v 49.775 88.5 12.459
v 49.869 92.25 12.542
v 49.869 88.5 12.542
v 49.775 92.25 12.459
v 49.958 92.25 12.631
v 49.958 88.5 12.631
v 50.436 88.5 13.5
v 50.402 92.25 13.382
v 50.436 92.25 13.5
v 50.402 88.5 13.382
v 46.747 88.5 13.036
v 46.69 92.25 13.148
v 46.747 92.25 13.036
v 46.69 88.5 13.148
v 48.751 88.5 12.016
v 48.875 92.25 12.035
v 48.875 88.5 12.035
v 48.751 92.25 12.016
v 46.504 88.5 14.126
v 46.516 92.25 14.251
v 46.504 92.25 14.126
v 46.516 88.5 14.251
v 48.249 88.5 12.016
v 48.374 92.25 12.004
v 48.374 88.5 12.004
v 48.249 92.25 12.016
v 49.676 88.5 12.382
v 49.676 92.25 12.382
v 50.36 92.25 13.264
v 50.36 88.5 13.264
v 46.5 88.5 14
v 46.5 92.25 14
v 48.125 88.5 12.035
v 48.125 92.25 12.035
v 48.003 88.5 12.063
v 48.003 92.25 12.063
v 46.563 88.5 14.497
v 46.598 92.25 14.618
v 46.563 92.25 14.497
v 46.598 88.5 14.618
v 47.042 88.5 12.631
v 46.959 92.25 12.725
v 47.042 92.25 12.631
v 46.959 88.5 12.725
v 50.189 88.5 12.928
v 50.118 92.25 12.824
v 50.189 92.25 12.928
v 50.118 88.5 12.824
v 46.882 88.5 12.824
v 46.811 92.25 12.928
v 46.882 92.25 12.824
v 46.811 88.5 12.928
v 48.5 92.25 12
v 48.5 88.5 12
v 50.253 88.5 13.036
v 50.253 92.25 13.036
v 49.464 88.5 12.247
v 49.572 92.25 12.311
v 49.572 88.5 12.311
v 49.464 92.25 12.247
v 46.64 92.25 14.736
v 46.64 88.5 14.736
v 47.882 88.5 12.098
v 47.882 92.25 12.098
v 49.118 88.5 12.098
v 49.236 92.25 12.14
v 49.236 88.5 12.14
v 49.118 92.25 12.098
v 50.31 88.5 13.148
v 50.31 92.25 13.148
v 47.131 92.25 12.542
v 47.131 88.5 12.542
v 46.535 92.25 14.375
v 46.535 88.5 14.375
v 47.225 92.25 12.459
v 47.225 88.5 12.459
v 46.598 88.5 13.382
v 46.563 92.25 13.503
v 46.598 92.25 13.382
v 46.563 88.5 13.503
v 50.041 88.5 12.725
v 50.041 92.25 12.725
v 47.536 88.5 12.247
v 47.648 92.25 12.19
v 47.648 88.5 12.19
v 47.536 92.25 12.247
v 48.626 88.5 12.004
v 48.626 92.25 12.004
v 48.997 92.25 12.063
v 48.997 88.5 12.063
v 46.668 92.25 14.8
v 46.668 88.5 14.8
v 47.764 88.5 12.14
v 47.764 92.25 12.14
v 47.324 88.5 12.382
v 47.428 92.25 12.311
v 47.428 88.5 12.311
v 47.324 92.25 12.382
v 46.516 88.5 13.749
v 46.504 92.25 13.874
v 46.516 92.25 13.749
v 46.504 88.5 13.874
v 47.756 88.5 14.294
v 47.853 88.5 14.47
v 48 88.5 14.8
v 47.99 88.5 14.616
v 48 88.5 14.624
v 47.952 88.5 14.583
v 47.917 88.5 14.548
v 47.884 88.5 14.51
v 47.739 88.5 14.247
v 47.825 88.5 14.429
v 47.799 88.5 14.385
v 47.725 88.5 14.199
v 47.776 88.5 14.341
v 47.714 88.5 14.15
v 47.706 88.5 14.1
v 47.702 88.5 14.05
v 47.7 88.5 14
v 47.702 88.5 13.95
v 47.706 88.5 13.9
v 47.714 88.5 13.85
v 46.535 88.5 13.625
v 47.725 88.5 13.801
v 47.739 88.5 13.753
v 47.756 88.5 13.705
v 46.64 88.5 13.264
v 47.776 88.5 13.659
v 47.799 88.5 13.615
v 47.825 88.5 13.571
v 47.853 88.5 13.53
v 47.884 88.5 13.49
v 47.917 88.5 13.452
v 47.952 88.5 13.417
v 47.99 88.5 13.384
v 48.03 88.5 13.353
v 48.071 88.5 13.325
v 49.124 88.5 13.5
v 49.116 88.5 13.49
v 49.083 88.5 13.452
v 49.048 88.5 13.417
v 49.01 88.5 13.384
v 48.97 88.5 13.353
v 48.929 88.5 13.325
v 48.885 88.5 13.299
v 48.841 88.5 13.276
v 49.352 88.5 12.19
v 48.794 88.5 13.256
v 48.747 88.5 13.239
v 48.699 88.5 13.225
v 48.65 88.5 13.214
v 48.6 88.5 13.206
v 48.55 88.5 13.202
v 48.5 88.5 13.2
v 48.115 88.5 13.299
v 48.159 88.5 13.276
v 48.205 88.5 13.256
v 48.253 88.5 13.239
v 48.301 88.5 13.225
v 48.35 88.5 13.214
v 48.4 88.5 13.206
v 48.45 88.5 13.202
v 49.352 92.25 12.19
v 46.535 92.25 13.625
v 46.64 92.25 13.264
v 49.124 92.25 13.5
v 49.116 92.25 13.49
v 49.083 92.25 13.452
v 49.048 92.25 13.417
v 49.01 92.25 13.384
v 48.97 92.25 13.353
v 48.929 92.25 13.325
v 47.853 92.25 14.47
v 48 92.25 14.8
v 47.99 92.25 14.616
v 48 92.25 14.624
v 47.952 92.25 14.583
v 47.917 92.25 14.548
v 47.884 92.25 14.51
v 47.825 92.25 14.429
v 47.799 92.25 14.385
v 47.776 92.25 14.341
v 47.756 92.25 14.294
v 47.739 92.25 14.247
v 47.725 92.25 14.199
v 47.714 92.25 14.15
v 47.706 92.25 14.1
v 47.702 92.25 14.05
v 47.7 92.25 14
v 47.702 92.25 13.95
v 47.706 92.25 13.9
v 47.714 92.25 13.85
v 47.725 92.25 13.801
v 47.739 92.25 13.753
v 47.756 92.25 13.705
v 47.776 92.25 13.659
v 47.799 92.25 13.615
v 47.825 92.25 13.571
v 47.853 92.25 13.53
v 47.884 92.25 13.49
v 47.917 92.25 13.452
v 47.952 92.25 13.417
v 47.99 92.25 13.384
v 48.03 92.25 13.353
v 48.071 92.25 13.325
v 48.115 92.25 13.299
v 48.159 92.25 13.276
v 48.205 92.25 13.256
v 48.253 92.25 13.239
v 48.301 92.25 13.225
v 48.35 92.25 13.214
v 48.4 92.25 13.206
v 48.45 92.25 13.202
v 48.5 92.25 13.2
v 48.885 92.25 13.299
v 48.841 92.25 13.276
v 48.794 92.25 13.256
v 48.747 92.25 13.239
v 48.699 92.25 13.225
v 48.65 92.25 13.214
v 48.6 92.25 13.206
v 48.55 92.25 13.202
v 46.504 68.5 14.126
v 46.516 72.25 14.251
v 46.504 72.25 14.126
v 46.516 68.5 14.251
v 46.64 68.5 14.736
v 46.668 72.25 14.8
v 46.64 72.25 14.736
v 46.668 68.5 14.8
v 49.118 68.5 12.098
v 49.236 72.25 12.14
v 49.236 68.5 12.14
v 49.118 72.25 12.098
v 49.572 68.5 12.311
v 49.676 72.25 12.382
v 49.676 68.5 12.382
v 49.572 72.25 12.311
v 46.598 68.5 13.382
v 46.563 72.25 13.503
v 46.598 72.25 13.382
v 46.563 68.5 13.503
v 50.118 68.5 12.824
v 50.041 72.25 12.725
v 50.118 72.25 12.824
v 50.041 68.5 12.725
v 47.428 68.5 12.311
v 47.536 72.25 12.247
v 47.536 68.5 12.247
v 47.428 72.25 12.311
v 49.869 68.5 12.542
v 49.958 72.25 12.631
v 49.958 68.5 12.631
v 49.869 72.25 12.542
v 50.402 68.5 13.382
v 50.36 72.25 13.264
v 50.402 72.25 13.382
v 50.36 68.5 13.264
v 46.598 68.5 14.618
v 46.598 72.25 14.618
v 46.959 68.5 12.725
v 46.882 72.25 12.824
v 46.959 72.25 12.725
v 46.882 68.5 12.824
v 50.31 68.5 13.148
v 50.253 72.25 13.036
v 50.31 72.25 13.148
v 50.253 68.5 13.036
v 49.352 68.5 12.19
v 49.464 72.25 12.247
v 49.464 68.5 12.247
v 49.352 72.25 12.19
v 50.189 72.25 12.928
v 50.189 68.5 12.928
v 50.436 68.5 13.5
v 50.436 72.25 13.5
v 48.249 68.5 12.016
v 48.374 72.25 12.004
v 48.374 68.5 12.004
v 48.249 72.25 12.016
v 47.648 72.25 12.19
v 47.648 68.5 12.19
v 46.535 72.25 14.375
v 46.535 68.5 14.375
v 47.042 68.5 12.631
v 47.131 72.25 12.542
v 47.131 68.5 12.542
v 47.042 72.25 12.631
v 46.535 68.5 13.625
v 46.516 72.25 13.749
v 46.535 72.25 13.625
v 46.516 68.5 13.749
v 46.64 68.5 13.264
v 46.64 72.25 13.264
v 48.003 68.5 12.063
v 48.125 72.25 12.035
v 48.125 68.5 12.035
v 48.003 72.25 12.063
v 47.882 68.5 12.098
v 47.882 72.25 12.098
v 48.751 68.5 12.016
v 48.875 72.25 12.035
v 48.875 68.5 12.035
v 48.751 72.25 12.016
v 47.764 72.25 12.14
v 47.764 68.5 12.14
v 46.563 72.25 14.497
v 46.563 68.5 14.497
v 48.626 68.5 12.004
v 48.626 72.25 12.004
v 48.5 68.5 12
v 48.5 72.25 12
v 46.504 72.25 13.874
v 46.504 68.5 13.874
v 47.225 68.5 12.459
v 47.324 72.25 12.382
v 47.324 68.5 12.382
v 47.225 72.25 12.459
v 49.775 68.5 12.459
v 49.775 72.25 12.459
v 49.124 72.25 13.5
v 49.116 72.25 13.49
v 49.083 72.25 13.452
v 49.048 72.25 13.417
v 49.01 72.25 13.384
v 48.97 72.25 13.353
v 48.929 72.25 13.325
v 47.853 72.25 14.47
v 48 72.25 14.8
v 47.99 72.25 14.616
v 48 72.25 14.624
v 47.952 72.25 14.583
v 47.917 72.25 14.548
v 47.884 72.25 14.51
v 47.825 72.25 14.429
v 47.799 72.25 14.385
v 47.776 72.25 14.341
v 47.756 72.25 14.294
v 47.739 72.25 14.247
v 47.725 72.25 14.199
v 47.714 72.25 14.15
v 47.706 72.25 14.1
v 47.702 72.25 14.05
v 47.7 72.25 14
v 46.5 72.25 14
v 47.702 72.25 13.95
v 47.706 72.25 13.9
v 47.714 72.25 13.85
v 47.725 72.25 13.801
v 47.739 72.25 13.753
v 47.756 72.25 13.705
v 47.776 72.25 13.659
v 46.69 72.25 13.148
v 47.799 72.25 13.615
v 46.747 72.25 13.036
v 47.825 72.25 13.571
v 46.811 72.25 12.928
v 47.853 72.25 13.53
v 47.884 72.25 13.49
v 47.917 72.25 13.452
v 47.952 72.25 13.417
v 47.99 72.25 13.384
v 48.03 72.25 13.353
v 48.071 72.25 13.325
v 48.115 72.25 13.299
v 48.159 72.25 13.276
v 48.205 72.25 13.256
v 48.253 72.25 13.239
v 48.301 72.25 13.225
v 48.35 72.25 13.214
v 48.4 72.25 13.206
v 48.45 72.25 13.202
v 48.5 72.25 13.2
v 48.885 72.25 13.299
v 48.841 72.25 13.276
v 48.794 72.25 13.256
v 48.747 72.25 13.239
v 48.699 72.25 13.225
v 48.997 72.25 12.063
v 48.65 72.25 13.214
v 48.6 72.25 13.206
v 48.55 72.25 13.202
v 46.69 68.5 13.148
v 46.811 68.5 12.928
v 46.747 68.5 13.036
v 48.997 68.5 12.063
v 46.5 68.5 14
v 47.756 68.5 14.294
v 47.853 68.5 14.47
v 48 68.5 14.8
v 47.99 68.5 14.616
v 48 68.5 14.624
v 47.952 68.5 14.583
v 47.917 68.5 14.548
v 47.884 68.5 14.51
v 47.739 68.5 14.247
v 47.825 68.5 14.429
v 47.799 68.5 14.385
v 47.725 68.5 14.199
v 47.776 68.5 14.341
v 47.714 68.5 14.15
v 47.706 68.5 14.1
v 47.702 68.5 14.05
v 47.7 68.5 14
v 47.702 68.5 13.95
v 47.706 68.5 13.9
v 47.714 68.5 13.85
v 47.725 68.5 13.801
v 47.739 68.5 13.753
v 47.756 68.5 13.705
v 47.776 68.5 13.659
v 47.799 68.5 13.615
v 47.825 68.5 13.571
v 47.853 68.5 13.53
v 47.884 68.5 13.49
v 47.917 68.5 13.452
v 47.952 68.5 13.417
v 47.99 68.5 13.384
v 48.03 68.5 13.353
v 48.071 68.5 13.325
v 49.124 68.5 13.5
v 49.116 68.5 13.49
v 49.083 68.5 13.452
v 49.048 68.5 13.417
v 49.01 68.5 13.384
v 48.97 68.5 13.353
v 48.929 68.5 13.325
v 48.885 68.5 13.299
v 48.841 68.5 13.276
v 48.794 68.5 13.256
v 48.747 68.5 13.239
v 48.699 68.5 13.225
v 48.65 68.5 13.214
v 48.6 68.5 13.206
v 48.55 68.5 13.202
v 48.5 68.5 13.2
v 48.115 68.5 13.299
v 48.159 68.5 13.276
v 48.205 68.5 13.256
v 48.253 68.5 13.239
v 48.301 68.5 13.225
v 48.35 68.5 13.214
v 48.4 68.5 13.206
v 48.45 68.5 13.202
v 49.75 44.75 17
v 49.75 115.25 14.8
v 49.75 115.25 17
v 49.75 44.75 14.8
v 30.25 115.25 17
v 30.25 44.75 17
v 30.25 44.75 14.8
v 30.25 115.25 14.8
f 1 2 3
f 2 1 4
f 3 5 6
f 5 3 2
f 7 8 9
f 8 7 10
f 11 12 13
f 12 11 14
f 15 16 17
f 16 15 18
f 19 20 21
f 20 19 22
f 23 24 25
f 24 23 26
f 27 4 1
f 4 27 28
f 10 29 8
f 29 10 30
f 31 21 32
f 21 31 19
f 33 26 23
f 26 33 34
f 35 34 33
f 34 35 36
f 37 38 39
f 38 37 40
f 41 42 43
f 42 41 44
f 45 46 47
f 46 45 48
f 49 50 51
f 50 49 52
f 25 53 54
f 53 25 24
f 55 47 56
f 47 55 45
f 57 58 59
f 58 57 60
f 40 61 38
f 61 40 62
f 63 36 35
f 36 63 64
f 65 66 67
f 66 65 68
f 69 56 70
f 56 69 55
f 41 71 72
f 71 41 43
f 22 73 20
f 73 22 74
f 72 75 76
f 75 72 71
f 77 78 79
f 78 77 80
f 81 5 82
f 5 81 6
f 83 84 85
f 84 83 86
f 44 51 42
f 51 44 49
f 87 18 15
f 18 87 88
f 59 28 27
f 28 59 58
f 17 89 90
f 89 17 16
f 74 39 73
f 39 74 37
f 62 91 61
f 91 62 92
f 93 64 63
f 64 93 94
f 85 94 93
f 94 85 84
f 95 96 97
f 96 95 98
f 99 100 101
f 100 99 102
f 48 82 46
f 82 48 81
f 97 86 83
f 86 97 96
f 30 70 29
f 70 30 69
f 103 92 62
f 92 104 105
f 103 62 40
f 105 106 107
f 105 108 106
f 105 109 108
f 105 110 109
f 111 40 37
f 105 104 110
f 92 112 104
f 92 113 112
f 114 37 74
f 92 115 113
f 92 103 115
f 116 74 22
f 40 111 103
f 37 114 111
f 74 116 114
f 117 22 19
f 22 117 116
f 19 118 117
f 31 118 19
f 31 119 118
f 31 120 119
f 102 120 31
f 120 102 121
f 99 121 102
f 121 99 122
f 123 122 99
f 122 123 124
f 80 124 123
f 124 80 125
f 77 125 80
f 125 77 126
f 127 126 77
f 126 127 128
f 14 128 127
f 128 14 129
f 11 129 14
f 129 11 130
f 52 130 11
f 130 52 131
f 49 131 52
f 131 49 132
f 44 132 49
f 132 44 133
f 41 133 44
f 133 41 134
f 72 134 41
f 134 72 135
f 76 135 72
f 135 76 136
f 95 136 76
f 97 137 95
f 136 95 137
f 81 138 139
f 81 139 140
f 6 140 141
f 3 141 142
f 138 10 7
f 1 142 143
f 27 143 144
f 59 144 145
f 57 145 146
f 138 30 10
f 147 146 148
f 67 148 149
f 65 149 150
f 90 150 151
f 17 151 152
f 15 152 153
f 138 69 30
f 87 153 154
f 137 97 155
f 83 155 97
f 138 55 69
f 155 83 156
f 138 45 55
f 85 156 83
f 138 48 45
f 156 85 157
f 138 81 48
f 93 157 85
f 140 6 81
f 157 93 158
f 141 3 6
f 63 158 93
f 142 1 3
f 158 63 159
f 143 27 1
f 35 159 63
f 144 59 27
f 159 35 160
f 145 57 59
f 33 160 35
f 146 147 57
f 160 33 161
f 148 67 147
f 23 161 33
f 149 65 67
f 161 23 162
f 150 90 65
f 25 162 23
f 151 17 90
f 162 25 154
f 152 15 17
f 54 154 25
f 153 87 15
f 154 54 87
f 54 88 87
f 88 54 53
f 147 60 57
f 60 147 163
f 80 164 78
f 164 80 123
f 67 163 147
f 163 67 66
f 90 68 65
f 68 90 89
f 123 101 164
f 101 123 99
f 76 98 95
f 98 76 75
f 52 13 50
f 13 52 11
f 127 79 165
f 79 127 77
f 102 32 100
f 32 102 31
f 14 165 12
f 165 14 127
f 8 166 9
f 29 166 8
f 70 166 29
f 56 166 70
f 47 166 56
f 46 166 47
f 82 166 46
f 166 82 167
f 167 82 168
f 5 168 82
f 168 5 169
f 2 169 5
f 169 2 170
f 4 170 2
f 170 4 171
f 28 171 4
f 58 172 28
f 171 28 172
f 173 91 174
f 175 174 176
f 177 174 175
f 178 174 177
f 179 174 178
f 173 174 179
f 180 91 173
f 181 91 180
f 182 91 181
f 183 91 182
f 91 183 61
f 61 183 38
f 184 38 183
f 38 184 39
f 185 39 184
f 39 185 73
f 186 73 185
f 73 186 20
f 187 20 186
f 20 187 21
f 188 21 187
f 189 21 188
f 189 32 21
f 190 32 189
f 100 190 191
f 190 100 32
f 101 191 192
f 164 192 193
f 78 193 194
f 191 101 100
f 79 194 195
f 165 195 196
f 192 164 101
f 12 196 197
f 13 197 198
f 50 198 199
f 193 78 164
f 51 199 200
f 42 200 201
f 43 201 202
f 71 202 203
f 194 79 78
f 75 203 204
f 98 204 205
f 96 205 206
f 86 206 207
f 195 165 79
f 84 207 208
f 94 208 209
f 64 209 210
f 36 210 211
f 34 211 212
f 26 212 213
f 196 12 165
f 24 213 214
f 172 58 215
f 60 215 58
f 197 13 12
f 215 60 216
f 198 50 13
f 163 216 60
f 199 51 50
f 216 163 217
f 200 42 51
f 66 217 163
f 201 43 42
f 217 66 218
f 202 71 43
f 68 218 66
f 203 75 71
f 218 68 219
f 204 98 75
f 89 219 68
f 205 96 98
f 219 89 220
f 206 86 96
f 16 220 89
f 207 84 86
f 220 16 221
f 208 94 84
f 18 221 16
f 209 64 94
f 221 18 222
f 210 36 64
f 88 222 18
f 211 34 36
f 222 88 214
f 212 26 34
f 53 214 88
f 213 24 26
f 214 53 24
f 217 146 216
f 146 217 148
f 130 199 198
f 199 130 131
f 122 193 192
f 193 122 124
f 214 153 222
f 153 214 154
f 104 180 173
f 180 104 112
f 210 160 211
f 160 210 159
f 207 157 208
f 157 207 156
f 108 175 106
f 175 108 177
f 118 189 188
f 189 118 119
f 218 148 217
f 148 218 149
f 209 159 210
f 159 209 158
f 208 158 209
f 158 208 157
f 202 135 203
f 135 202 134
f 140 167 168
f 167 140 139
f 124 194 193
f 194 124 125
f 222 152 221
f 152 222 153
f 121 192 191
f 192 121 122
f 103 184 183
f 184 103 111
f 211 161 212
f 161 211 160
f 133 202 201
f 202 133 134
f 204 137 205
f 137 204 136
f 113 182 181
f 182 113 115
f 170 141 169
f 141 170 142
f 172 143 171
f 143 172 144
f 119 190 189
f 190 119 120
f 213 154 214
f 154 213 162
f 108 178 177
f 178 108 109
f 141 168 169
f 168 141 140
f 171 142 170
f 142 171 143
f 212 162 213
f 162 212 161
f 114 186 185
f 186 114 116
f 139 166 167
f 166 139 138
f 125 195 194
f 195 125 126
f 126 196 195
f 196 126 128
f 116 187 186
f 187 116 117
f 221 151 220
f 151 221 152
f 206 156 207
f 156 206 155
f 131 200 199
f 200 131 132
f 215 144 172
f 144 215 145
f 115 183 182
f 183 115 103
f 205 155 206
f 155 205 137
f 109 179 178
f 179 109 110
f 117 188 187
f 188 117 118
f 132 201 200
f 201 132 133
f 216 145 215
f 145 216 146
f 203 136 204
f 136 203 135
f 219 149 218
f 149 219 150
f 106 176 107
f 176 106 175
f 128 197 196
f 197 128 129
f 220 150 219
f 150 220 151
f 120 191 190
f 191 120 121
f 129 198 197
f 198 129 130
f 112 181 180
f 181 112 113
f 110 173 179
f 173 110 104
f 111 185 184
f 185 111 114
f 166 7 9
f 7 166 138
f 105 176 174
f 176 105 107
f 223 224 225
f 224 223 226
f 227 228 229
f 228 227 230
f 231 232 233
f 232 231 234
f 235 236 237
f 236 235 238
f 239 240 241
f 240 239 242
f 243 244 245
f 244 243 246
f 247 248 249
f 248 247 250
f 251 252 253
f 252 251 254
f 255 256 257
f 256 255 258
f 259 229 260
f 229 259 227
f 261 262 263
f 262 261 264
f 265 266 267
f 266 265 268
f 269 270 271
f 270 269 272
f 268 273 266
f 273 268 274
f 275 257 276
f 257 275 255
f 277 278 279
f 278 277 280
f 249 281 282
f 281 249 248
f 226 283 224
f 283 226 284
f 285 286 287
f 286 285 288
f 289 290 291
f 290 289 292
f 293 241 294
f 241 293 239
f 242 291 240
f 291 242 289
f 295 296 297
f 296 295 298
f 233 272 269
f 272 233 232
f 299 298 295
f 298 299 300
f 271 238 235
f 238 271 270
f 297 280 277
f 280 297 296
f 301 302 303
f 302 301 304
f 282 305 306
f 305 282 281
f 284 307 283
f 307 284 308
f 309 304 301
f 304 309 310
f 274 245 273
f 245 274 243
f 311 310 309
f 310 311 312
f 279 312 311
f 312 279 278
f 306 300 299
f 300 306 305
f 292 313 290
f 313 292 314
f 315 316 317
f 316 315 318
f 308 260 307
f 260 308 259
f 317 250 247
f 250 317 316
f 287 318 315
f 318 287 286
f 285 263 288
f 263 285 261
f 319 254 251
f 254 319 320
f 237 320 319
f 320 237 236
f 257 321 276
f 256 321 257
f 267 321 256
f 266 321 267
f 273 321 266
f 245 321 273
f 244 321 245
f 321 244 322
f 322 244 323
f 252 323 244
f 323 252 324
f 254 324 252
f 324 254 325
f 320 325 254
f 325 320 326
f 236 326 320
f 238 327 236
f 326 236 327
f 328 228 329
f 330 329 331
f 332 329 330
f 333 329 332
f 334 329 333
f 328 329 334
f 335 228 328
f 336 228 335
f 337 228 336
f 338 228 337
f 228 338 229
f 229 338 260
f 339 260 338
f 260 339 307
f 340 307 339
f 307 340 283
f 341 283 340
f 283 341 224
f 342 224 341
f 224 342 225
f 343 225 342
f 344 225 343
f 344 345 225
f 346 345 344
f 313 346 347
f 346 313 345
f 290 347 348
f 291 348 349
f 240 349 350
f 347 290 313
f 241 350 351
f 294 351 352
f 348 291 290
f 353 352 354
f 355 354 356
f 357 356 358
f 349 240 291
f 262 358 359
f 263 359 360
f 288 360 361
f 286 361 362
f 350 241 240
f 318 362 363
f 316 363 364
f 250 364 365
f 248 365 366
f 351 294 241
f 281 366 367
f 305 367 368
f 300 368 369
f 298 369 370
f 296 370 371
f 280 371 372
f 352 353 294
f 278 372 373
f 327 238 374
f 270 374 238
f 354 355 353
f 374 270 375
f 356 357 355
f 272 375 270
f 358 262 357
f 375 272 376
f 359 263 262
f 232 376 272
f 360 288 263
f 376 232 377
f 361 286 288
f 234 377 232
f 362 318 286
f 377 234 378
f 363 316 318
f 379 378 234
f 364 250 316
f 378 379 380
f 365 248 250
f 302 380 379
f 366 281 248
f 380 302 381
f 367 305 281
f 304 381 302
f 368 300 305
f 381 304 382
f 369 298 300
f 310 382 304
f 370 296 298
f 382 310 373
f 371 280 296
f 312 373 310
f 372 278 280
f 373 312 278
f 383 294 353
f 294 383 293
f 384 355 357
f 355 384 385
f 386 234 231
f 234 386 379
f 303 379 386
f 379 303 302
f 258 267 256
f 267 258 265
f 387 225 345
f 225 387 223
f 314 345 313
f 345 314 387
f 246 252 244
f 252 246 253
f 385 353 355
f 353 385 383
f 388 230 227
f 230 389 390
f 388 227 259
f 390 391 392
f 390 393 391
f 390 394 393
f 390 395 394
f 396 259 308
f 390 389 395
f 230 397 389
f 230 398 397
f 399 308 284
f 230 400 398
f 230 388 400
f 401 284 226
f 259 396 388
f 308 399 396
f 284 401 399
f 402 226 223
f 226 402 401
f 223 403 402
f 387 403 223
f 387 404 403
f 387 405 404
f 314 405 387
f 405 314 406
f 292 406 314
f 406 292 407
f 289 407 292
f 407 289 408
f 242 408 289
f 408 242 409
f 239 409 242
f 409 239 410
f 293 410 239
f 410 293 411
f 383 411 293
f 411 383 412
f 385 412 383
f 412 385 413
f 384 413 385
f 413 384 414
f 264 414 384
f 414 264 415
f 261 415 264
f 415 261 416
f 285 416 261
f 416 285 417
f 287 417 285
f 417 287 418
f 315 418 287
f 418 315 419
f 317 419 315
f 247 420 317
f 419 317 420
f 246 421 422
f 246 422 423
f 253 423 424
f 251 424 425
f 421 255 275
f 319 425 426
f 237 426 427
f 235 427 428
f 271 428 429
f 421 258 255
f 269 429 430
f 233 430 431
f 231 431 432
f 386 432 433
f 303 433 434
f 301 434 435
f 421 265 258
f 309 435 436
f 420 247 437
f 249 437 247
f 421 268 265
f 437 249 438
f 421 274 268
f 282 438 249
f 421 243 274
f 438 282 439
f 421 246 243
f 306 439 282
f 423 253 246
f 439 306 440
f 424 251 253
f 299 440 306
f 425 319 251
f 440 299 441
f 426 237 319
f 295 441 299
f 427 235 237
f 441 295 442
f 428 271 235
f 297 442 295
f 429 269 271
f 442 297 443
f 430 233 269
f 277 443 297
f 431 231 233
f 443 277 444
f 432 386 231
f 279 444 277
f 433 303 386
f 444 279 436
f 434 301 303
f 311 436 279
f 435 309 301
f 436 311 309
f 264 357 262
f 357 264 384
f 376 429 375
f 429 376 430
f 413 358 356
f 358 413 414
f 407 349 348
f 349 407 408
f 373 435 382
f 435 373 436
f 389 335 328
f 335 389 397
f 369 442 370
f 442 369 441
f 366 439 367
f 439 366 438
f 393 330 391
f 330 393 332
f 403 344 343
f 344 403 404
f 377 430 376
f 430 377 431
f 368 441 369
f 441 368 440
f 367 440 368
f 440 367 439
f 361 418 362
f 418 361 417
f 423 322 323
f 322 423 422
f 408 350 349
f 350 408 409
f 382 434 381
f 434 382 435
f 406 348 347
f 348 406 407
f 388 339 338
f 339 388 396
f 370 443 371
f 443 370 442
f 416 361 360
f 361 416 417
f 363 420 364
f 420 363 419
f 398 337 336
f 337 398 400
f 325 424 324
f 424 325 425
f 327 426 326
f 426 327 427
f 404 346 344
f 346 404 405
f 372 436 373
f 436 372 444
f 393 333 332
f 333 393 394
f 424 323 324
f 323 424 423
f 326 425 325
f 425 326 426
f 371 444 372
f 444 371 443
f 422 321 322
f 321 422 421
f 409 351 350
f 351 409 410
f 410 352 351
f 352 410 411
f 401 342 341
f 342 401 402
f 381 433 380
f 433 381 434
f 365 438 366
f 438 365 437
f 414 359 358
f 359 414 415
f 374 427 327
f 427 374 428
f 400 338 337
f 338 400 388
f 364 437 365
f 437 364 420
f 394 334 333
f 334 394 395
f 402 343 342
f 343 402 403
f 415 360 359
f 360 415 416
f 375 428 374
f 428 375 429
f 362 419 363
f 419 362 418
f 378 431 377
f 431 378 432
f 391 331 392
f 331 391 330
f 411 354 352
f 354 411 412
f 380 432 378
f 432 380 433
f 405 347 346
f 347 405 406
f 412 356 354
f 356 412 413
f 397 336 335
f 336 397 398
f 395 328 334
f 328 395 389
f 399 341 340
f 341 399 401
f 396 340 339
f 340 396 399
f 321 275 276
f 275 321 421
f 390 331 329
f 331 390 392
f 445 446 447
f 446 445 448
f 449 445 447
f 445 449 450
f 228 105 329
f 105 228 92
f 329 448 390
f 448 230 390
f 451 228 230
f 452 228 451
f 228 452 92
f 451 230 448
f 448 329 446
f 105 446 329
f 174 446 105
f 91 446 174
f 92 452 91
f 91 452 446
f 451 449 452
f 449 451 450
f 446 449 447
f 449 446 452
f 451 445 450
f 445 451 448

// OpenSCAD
translate( [40,80,15.9] ) cube([19.5,71.5-1,2.2], true, $fn=100);
//Plattform
difference(){
    rotate(-90,[50,0,0]) translate( [48.5,-14,88.5] ) cylinder (h = 3.75, r=2, $fn=100);
    rotate(-90,[50,0,0]) translate( [48.5,-14,88.25] ) cylinder (h = 8, r=0.8, $fn=100);
    translate( [49.5,90,15.5] ) cube([3,5,4], true);
}

//Fixation
difference(){
    rotate(-90,[50,0,0]) translate( [48.5,-14,68.5] ) cylinder (h = 3.75, r=2, $fn=100);
    rotate(-90,[50,0,0]) translate( [48.5,-14,68.25] ) cylinder (h = 8, r=0.8, $fn=100);
    translate( [49.5,70,15.5] ) cube([3,5,4], true);
}
